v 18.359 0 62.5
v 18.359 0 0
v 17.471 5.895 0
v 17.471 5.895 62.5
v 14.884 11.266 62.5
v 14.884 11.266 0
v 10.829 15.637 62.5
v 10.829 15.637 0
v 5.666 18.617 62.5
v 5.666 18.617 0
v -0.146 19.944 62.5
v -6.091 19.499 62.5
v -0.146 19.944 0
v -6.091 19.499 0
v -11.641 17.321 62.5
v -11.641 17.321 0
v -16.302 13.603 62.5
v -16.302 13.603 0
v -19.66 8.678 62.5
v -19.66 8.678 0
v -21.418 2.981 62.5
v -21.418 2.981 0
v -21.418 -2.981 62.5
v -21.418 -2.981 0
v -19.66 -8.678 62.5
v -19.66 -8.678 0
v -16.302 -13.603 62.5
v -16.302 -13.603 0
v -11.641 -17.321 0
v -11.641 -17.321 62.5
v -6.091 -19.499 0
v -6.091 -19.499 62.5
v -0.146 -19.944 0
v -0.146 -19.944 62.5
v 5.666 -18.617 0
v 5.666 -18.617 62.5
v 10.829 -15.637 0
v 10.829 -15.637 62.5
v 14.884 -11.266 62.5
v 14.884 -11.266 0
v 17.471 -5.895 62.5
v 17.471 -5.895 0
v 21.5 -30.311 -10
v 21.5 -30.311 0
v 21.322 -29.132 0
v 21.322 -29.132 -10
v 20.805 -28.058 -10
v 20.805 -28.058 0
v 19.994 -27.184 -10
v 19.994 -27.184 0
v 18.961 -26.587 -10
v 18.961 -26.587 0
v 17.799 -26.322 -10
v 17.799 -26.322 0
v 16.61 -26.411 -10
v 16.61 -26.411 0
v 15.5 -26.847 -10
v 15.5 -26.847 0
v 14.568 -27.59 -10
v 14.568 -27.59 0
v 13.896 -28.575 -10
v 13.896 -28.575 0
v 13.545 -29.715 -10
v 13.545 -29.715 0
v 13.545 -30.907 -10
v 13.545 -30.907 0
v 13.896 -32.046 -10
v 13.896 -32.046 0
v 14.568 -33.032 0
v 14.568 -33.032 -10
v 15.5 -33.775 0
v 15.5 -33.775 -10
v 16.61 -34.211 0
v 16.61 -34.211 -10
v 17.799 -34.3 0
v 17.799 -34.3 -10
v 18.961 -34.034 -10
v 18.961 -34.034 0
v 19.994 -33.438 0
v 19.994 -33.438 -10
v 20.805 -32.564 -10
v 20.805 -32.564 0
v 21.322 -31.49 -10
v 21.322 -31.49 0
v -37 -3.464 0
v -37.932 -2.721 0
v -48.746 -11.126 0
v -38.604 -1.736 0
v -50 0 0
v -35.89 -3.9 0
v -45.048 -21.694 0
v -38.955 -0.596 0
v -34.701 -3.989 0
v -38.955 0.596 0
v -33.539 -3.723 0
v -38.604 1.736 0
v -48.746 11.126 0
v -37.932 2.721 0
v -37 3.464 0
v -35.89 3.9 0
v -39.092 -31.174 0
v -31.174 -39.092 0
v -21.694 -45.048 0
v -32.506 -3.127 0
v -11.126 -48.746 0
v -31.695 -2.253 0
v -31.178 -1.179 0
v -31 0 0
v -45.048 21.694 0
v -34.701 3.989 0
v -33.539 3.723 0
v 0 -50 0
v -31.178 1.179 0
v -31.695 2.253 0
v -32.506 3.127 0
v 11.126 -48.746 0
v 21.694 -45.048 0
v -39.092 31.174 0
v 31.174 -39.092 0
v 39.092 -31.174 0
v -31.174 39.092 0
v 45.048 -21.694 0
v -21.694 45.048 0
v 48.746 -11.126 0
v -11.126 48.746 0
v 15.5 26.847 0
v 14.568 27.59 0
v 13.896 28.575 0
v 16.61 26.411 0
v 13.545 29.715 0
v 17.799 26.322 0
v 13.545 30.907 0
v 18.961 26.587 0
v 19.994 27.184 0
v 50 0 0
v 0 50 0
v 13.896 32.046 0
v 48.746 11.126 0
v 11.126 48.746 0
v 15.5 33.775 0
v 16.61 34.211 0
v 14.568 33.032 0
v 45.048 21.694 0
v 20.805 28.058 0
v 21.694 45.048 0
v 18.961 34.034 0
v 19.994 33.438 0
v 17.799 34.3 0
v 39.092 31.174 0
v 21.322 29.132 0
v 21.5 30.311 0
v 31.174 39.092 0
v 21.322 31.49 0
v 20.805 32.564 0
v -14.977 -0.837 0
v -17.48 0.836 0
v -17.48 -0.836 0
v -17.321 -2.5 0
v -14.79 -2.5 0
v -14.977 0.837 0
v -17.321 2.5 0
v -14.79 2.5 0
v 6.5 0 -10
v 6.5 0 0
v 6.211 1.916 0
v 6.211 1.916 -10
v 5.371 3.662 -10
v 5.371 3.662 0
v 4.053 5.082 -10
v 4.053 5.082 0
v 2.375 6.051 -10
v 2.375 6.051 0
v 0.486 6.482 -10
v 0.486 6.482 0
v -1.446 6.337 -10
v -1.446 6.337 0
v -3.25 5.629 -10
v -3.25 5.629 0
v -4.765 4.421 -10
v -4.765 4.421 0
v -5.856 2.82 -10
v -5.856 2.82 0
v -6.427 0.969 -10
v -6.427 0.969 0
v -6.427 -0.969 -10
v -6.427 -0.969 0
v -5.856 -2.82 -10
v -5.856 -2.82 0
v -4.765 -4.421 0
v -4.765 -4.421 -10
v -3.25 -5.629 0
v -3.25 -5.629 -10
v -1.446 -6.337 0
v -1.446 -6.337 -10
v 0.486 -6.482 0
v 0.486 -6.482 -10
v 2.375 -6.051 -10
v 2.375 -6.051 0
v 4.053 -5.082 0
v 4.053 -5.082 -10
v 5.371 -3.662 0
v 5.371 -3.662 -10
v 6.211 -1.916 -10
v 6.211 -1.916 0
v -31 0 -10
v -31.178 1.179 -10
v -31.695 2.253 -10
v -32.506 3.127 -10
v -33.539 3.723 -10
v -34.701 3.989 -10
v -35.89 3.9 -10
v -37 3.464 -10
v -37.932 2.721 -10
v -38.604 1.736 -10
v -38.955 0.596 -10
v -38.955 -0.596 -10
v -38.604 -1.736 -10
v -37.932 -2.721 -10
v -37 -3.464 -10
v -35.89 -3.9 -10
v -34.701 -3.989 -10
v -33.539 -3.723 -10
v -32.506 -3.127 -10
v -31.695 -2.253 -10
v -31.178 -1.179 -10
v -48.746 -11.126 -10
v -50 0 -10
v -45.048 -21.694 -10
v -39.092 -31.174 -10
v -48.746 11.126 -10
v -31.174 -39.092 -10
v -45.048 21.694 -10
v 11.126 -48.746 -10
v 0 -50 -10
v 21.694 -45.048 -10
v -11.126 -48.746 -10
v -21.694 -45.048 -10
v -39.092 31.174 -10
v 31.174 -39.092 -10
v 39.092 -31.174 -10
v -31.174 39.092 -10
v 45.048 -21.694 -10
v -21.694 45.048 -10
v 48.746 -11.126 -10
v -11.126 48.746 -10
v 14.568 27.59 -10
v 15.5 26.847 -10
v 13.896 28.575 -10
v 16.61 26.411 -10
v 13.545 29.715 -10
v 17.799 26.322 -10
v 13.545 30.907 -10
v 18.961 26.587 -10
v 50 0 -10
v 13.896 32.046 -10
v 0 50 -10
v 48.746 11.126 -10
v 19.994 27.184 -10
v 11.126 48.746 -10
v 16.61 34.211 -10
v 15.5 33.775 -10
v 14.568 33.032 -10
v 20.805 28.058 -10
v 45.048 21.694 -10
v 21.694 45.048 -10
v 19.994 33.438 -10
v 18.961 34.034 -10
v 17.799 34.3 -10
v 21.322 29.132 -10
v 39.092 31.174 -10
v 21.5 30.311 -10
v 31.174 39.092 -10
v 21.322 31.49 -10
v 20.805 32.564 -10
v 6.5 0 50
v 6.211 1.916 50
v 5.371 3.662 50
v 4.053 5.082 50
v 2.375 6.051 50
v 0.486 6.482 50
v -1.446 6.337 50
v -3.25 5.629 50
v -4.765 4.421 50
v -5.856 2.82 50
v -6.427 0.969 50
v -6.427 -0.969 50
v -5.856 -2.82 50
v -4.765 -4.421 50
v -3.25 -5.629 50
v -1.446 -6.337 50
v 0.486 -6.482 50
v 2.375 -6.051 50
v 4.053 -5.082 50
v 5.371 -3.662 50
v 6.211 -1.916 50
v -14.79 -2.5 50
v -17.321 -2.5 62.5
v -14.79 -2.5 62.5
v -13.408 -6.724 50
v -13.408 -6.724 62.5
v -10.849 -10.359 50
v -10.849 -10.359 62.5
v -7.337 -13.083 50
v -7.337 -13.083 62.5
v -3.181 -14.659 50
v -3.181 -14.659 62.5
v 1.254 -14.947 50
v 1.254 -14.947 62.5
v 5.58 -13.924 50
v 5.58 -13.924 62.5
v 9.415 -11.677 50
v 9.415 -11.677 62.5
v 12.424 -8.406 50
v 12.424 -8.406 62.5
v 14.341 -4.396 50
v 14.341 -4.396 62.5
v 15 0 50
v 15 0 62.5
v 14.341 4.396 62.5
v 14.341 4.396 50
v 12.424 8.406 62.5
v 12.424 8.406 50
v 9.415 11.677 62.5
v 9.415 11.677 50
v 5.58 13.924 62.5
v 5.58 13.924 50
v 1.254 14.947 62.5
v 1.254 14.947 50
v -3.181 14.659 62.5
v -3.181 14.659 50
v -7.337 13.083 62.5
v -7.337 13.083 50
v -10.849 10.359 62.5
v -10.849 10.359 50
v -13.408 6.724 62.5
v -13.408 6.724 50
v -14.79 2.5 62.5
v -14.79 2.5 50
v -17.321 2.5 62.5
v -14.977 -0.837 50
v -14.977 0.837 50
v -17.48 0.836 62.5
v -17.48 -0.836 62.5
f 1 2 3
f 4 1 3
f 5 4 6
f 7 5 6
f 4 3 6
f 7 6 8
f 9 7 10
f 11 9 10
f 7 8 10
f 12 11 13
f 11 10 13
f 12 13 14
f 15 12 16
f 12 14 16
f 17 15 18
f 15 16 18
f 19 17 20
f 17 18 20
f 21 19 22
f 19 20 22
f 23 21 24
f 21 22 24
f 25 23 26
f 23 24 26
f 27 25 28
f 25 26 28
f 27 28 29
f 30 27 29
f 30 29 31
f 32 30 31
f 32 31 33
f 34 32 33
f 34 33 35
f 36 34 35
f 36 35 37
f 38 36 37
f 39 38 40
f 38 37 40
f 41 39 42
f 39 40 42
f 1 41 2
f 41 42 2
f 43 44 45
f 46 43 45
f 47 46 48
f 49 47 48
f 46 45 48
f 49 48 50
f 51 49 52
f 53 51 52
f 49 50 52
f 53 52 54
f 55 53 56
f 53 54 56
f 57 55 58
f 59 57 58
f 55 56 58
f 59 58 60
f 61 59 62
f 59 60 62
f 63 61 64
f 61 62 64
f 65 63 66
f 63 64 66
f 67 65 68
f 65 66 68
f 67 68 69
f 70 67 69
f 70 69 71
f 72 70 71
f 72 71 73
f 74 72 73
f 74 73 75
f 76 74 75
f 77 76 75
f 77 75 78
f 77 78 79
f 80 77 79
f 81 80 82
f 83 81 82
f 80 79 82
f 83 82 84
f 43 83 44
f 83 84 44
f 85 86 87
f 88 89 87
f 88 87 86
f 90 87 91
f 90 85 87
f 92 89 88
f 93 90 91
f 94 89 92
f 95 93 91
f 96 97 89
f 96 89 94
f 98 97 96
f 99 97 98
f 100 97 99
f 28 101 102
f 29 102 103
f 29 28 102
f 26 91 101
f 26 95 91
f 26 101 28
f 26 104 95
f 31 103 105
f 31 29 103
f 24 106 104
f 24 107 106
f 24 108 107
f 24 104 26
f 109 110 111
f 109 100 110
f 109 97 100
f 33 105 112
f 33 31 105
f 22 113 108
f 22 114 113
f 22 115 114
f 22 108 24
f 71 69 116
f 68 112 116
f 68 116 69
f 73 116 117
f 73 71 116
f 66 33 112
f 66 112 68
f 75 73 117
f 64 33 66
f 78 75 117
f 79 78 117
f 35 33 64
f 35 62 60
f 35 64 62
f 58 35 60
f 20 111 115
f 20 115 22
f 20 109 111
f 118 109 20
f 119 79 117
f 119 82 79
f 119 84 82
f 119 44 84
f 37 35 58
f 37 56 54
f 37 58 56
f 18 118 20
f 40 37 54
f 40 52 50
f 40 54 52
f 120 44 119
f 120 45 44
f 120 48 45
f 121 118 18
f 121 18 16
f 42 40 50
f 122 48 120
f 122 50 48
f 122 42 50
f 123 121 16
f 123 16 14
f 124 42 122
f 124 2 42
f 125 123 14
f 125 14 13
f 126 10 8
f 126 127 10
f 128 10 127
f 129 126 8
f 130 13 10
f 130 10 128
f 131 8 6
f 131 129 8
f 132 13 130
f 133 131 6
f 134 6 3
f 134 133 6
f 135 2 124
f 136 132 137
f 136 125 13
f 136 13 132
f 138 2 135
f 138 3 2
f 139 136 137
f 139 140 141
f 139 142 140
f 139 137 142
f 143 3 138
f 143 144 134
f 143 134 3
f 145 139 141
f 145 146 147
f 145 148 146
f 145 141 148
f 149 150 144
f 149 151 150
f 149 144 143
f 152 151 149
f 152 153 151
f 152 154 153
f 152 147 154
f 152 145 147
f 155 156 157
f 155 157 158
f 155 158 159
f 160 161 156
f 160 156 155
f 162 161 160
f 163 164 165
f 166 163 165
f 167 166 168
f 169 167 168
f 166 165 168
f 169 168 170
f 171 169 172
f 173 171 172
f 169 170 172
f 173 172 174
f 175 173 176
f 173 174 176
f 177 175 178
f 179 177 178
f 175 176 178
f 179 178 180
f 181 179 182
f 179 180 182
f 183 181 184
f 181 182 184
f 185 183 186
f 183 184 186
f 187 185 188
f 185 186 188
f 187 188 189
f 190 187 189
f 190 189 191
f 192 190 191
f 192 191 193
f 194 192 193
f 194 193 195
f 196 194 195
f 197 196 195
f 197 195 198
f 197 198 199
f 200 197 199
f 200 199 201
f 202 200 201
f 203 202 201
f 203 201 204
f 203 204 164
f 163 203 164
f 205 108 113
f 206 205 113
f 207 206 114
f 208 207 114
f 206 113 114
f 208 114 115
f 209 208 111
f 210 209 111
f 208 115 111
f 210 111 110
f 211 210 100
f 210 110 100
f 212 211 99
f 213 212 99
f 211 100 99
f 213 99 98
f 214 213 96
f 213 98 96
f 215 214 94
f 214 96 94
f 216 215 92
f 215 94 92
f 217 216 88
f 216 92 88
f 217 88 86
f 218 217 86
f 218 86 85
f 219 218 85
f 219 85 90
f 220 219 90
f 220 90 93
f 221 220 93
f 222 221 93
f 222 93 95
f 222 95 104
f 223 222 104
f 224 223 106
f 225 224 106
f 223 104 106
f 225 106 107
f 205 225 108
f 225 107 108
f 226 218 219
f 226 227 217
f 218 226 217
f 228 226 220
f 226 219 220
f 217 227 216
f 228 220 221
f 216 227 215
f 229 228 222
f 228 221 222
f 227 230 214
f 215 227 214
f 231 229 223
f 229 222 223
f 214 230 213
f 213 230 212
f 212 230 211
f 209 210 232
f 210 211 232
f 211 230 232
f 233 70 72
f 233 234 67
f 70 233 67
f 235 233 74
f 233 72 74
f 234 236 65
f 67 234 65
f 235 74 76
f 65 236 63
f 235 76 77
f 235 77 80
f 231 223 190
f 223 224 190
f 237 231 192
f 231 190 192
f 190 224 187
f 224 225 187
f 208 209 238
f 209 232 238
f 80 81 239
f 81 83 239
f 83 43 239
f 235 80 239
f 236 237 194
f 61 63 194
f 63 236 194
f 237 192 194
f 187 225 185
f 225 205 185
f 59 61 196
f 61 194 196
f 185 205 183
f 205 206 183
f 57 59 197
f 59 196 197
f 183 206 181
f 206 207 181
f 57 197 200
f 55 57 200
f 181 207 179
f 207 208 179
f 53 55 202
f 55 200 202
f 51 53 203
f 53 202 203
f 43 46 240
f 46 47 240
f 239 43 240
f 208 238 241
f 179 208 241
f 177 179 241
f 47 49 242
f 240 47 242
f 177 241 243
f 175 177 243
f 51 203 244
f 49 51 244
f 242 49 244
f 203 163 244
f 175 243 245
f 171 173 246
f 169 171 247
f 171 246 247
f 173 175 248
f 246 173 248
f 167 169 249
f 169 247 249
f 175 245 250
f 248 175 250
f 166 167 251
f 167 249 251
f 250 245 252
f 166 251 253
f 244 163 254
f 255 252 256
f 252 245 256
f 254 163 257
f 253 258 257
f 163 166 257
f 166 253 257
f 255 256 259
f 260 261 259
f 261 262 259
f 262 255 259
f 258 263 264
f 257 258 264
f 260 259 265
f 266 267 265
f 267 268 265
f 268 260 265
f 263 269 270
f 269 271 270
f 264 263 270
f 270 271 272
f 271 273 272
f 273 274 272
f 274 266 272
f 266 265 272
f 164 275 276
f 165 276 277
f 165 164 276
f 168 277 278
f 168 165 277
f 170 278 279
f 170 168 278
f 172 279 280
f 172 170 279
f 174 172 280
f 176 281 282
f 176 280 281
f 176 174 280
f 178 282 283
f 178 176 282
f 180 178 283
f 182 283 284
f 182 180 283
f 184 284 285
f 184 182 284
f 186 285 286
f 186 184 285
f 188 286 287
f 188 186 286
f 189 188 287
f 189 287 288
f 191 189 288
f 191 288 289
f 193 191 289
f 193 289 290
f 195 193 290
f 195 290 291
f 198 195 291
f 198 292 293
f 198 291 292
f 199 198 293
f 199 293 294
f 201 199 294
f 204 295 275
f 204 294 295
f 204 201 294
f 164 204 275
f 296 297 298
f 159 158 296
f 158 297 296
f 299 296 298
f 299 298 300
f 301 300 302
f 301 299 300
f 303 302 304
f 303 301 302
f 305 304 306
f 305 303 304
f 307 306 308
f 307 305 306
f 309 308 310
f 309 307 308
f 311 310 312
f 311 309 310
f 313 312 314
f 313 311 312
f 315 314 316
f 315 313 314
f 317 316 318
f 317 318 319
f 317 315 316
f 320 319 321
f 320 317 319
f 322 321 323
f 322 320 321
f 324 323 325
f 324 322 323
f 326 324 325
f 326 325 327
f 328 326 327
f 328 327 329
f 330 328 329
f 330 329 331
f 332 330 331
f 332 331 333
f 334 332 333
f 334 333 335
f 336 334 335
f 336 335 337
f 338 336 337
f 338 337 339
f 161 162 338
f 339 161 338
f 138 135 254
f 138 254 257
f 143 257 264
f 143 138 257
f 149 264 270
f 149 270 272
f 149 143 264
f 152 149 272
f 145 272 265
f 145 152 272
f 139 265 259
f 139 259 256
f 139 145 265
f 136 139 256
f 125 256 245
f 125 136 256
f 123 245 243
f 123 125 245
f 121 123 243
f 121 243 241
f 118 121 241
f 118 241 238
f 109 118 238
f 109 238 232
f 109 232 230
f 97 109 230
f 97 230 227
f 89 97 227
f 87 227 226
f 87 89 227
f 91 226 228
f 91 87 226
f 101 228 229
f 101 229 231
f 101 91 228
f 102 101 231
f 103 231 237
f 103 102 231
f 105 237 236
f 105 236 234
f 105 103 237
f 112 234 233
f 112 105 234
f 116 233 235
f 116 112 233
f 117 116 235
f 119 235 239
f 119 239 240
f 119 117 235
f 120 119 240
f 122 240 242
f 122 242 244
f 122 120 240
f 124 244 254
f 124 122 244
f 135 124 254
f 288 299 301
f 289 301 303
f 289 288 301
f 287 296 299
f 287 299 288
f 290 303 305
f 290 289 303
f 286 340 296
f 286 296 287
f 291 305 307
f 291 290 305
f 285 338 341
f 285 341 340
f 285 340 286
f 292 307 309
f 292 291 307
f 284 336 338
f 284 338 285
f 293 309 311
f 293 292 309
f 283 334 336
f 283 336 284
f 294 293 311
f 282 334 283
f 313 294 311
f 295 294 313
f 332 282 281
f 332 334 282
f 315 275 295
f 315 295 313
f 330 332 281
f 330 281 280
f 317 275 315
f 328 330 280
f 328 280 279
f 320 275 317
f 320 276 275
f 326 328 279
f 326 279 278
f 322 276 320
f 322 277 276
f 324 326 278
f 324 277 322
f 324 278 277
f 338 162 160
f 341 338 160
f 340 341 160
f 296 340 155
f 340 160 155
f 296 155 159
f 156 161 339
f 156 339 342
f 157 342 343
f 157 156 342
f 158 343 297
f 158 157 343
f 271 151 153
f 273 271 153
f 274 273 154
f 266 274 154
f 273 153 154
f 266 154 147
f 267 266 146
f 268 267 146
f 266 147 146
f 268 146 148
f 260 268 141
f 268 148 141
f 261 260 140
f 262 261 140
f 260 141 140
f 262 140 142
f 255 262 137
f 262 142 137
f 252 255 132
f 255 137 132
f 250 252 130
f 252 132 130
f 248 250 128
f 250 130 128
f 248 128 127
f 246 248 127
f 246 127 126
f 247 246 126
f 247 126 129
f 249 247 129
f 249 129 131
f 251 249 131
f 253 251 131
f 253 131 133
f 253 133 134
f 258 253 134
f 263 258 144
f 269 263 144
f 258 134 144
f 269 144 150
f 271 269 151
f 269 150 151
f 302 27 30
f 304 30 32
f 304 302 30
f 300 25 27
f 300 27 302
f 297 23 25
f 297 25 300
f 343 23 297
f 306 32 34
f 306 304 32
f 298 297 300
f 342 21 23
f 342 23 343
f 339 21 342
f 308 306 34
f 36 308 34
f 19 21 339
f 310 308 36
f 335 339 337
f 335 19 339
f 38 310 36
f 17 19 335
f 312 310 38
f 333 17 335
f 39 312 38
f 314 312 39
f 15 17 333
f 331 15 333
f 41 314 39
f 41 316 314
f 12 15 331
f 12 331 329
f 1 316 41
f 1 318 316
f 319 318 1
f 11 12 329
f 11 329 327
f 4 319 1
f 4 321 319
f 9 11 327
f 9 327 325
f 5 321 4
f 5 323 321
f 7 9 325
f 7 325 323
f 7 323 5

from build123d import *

# Parameters (mm, degrees)
SKETCH1_R               = 50
BOSS_EXTRUDE1_DEPTH     = 10
SKETCH1_3_R             = 4
CUT_EXTRUDE1_DEPTH      = 10
SKETCH1_4_R             = 20
BOSS_EXTRUDE2_DEPTH     = 62.5
SKETCH4_R               = 15
BOSS_EXTRUDE4_DEPTH     = 50
SKETCH3_R               = 6.5
CUT_EXTRUDE3_DEPTH      = 63.5
CUT_EXTRUDE3_DEPTH_BACK = 11


with BuildPart() as part:
    # Sketch1 → Boss-Extrude1 (new body)
    with BuildSketch(Plane.XY):
        Circle(SKETCH1_R)
    extrude(amount=-BOSS_EXTRUDE1_DEPTH)

    # Sketch1<3> → Cut-Extrude1 (cut)
    with BuildSketch(Plane.XY):
        with Locations((-35, 0)):
            Circle(SKETCH1_3_R)
        with Locations((17.5, 30.310889132)):
            Circle(SKETCH1_3_R)
        with Locations((17.5, -30.310889132)):
            Circle(SKETCH1_3_R)
    extrude(amount=-CUT_EXTRUDE1_DEPTH, mode=Mode.SUBTRACT)

    # Sketch1<4> → Boss-Extrude2 (add)
    with BuildSketch(Plane.XY):
        with Locations((-1.640921825, 0)):
            Circle(SKETCH1_4_R)
        with BuildLine():
            ThreePointArc((-17.320508076, 2.5), (-17.5, 0), (-17.320508076, -2.5))
            Line((-17.320508076, -2.5), (-14.790199458, -2.5))
            ThreePointArc((-14.790199458, -2.5), (15, 0), (-14.790199458, 2.5))
            Line((-14.790199458, 2.5), (-17.320508076, 2.5))
        make_face(mode=Mode.SUBTRACT)
    extrude(amount=BOSS_EXTRUDE2_DEPTH)

    # Sketch4 → Boss-Extrude4 (add)
    with BuildSketch(Plane.XY):
        Circle(SKETCH4_R)
    extrude(amount=BOSS_EXTRUDE4_DEPTH)

    # Sketch3 → Cut-Extrude3 (cut, two sides)
    with BuildSketch(Plane.XY) as cut_extrude3_sk:
        Circle(SKETCH3_R)
    extrude(amount=CUT_EXTRUDE3_DEPTH, mode=Mode.SUBTRACT)
    extrude(cut_extrude3_sk.sketch, amount=-CUT_EXTRUDE3_DEPTH_BACK, mode=Mode.SUBTRACT)


solid = part.part
